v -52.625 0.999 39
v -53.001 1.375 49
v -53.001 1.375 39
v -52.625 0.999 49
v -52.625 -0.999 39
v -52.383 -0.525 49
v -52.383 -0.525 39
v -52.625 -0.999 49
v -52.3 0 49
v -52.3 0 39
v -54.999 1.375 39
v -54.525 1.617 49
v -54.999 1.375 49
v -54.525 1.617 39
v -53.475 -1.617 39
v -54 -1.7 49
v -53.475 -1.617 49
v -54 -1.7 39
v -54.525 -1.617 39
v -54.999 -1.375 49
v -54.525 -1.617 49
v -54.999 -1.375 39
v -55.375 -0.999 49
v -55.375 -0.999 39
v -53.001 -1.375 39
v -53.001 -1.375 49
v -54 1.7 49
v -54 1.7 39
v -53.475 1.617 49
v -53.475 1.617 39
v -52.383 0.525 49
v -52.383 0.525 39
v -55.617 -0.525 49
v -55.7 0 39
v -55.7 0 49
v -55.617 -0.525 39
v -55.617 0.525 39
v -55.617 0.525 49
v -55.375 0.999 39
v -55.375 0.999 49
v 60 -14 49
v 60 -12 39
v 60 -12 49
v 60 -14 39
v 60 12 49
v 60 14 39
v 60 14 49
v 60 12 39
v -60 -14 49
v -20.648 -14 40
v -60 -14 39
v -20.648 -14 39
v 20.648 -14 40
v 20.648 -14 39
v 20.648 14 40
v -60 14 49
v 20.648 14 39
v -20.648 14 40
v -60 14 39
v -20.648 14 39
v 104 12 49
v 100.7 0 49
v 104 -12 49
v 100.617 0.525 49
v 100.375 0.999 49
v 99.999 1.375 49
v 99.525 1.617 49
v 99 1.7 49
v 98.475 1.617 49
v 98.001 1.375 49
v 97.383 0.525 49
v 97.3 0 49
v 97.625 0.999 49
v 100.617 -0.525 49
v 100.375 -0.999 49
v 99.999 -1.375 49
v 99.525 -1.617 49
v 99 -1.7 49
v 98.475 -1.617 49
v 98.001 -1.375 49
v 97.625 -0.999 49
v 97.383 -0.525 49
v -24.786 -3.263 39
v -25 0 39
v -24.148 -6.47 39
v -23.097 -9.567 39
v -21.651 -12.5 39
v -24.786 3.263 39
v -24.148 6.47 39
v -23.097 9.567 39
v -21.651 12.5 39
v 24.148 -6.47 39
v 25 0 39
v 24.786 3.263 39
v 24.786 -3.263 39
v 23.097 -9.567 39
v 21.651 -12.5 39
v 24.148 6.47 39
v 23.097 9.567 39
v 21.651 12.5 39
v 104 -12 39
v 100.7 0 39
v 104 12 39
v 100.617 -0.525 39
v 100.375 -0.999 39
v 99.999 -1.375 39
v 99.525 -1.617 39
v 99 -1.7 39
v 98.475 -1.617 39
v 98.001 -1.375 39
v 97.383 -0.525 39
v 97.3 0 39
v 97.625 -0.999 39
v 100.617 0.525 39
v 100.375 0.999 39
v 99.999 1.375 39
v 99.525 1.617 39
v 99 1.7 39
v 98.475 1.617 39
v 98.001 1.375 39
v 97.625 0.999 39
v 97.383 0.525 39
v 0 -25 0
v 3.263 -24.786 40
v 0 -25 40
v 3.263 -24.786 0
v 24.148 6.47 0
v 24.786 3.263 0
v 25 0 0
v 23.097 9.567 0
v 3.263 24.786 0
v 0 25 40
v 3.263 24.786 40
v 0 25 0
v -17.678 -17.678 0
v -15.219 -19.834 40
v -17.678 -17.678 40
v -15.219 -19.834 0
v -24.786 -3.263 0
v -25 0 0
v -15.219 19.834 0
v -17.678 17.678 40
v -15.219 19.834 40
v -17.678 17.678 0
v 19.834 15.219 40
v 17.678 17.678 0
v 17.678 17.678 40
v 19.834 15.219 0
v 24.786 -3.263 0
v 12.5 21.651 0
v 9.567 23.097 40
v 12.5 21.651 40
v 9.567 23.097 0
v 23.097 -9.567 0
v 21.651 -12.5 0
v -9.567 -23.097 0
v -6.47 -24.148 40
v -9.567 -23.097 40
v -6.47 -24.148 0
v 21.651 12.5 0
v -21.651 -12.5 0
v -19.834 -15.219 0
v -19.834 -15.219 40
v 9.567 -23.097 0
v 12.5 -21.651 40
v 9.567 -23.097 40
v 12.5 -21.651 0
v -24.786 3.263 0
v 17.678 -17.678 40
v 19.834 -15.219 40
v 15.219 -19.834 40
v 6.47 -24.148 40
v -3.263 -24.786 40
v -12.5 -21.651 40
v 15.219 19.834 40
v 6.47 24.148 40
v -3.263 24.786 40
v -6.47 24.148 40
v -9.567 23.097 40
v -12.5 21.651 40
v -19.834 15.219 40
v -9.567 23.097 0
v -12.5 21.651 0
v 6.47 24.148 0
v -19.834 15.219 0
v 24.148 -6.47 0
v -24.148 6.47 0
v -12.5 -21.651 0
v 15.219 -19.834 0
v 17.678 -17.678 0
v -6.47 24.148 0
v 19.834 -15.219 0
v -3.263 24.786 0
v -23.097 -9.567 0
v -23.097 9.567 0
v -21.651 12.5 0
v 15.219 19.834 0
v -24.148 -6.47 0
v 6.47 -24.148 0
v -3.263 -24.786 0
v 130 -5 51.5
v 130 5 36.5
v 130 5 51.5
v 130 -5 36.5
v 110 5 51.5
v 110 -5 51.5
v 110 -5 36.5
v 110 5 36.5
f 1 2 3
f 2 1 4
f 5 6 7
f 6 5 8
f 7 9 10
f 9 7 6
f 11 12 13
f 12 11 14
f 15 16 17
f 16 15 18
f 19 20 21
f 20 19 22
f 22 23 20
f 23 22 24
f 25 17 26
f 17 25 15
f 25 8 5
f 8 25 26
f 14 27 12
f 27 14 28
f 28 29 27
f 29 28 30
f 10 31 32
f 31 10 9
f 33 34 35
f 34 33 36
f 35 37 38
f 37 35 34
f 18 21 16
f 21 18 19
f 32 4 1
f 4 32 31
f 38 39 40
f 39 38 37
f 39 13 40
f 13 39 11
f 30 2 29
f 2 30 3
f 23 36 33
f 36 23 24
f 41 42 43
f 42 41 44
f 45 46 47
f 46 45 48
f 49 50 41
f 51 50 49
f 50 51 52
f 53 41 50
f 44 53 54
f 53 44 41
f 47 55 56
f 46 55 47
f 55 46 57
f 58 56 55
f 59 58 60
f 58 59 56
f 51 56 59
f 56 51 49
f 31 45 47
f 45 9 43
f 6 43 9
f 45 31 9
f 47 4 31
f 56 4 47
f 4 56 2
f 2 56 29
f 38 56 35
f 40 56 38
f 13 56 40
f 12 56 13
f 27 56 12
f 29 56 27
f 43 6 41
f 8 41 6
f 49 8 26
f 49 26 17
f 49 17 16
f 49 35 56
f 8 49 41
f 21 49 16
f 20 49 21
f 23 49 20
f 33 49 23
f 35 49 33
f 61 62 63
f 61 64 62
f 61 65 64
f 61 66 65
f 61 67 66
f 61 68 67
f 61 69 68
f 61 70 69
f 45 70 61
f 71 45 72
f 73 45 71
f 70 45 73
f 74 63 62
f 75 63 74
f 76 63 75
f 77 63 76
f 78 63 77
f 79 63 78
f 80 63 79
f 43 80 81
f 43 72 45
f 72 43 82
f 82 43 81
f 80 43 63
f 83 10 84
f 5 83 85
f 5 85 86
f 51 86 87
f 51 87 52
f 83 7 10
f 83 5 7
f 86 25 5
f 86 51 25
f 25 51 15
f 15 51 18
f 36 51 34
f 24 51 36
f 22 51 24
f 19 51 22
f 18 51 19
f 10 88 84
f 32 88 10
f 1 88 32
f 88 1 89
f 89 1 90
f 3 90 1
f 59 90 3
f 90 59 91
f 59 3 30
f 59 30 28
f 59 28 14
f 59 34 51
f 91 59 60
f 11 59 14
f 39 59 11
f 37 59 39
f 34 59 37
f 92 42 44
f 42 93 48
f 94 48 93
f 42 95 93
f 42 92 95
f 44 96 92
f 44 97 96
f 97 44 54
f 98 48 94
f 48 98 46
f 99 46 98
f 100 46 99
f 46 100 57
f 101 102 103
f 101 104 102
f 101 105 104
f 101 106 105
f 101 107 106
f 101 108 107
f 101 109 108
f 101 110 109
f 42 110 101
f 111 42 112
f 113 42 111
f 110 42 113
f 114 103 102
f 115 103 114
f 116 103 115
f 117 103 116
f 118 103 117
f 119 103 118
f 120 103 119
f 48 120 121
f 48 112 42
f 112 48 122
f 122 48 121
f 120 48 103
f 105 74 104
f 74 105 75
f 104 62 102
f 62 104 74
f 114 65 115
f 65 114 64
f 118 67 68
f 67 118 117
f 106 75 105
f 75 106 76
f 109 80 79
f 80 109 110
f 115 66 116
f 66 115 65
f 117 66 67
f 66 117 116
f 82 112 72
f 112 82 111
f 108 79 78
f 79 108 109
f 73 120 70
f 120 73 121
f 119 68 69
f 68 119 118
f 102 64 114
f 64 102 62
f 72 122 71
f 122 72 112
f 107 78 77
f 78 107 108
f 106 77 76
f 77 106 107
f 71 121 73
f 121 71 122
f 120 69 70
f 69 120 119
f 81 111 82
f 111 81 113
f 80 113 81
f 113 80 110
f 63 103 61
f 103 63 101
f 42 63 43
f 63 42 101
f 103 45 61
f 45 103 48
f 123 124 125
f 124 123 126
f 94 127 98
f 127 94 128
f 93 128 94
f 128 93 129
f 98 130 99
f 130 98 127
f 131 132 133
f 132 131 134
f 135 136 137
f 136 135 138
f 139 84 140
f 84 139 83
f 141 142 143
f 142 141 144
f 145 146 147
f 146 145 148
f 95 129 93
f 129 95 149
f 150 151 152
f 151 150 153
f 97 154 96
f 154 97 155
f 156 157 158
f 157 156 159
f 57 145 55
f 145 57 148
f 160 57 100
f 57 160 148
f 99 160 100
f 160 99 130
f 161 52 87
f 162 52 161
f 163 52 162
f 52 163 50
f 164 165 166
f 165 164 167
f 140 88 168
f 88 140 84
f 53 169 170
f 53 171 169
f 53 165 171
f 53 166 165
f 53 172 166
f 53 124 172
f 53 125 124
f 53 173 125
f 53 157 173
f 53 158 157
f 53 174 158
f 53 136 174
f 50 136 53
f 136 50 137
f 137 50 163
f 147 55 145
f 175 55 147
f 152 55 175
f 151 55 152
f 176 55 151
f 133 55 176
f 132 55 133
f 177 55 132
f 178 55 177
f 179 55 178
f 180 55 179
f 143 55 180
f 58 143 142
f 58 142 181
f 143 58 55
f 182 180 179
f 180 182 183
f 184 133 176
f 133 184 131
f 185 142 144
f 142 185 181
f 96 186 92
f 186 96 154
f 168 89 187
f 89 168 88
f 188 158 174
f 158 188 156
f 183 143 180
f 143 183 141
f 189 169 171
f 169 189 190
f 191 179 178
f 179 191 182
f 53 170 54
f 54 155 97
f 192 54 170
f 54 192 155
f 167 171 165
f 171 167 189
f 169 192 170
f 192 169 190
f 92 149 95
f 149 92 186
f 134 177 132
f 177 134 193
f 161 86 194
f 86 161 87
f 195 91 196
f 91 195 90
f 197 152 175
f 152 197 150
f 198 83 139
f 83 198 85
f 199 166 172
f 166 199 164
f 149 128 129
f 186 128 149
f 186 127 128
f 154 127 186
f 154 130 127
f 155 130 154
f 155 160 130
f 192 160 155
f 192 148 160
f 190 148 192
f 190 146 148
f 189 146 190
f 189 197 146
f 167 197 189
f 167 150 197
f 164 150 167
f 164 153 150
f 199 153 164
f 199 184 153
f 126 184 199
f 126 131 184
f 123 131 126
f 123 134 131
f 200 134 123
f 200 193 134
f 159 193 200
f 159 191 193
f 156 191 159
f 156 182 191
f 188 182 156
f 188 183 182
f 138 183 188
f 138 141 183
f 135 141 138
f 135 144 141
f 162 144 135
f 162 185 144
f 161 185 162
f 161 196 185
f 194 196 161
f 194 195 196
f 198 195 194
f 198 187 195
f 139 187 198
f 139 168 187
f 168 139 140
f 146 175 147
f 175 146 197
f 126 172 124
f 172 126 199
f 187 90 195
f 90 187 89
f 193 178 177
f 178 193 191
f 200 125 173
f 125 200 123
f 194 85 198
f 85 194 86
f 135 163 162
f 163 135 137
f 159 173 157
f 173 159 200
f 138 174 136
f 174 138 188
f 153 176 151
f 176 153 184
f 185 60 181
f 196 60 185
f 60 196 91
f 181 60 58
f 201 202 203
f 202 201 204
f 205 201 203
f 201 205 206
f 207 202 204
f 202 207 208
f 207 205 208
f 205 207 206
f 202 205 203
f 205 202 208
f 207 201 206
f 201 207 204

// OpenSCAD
// Parametric 3-DOF mechanical arm for the MyZubster mother robot.
// Base rotation + shoulder pitch + elbow pitch, with a gripper mount at the end.
// Issue #78 task: Braccio meccanico per assemblaggio.
// Print in PETG, 60% infill; use metal shafts + bearings at the joints.

// Parameters (mm)
base_height = 40;           // base mount height (above chassis rail)
base_dia = 50;              // base rotation disk diameter
shoulder_len = 120;        // upper arm link length
shoulder_w = 28;           // upper arm link width
elbow_len = 100;          // forearm link length
elbow_w = 24;             // forearm link width
link_h = 10;              // link thickness
joint_dia = 16;           // joint bearing diameter
gripper_mount_l = 20;     // gripper mount plate length
gripper_mount_w = 15;    // gripper mount plate width
bolt_dia = 3.4;          // M3 for joint shafts + motor mounts

$fn = 48;

module assembly_arm() {
  // base rotation disk + mount column
  cylinder(h = base_height, d = base_dia);
  translate([0, 0, base_height])
    cylinder(h = 4, d = joint_dia, $fn = 32);
  // upper arm (shoulder link)
  translate([0, 0, base_height + 4])
    rotate([90, 0, 0])
      difference() {
        cube([shoulder_len, link_h, shoulder_w], center = true);
        // joint holes at both ends
        for (sx = [-1, 1])
          translate([sx * (shoulder_len / 2 - 6), 0, 0])
            rotate([90, 0, 0])
              cylinder(h = link_h + 2, d = bolt_dia, $fn = 20, center = true);
      }
  // forearm (elbow link)
  translate([shoulder_len / 2 - 6, 0, base_height + 4])
    rotate([90, 0, 0])
      difference() {
        cube([elbow_len, link_h, elbow_w], center = true);
        for (sx = [-1, 1])
          translate([sx * (elbow_len / 2 - 5), 0, 0])
            rotate([90, 0, 0])
              cylinder(h = link_h + 2, d = bolt_dia, $fn = 20, center = true);
      }
  // gripper mount plate at end of forearm
  translate([shoulder_len, 0, base_height + 4])
    cube([gripper_mount_l, link_h, gripper_mount_w], center = true);
}

assembly_arm();
// Mount the base column into the left expansion rail of the mother chassis.
